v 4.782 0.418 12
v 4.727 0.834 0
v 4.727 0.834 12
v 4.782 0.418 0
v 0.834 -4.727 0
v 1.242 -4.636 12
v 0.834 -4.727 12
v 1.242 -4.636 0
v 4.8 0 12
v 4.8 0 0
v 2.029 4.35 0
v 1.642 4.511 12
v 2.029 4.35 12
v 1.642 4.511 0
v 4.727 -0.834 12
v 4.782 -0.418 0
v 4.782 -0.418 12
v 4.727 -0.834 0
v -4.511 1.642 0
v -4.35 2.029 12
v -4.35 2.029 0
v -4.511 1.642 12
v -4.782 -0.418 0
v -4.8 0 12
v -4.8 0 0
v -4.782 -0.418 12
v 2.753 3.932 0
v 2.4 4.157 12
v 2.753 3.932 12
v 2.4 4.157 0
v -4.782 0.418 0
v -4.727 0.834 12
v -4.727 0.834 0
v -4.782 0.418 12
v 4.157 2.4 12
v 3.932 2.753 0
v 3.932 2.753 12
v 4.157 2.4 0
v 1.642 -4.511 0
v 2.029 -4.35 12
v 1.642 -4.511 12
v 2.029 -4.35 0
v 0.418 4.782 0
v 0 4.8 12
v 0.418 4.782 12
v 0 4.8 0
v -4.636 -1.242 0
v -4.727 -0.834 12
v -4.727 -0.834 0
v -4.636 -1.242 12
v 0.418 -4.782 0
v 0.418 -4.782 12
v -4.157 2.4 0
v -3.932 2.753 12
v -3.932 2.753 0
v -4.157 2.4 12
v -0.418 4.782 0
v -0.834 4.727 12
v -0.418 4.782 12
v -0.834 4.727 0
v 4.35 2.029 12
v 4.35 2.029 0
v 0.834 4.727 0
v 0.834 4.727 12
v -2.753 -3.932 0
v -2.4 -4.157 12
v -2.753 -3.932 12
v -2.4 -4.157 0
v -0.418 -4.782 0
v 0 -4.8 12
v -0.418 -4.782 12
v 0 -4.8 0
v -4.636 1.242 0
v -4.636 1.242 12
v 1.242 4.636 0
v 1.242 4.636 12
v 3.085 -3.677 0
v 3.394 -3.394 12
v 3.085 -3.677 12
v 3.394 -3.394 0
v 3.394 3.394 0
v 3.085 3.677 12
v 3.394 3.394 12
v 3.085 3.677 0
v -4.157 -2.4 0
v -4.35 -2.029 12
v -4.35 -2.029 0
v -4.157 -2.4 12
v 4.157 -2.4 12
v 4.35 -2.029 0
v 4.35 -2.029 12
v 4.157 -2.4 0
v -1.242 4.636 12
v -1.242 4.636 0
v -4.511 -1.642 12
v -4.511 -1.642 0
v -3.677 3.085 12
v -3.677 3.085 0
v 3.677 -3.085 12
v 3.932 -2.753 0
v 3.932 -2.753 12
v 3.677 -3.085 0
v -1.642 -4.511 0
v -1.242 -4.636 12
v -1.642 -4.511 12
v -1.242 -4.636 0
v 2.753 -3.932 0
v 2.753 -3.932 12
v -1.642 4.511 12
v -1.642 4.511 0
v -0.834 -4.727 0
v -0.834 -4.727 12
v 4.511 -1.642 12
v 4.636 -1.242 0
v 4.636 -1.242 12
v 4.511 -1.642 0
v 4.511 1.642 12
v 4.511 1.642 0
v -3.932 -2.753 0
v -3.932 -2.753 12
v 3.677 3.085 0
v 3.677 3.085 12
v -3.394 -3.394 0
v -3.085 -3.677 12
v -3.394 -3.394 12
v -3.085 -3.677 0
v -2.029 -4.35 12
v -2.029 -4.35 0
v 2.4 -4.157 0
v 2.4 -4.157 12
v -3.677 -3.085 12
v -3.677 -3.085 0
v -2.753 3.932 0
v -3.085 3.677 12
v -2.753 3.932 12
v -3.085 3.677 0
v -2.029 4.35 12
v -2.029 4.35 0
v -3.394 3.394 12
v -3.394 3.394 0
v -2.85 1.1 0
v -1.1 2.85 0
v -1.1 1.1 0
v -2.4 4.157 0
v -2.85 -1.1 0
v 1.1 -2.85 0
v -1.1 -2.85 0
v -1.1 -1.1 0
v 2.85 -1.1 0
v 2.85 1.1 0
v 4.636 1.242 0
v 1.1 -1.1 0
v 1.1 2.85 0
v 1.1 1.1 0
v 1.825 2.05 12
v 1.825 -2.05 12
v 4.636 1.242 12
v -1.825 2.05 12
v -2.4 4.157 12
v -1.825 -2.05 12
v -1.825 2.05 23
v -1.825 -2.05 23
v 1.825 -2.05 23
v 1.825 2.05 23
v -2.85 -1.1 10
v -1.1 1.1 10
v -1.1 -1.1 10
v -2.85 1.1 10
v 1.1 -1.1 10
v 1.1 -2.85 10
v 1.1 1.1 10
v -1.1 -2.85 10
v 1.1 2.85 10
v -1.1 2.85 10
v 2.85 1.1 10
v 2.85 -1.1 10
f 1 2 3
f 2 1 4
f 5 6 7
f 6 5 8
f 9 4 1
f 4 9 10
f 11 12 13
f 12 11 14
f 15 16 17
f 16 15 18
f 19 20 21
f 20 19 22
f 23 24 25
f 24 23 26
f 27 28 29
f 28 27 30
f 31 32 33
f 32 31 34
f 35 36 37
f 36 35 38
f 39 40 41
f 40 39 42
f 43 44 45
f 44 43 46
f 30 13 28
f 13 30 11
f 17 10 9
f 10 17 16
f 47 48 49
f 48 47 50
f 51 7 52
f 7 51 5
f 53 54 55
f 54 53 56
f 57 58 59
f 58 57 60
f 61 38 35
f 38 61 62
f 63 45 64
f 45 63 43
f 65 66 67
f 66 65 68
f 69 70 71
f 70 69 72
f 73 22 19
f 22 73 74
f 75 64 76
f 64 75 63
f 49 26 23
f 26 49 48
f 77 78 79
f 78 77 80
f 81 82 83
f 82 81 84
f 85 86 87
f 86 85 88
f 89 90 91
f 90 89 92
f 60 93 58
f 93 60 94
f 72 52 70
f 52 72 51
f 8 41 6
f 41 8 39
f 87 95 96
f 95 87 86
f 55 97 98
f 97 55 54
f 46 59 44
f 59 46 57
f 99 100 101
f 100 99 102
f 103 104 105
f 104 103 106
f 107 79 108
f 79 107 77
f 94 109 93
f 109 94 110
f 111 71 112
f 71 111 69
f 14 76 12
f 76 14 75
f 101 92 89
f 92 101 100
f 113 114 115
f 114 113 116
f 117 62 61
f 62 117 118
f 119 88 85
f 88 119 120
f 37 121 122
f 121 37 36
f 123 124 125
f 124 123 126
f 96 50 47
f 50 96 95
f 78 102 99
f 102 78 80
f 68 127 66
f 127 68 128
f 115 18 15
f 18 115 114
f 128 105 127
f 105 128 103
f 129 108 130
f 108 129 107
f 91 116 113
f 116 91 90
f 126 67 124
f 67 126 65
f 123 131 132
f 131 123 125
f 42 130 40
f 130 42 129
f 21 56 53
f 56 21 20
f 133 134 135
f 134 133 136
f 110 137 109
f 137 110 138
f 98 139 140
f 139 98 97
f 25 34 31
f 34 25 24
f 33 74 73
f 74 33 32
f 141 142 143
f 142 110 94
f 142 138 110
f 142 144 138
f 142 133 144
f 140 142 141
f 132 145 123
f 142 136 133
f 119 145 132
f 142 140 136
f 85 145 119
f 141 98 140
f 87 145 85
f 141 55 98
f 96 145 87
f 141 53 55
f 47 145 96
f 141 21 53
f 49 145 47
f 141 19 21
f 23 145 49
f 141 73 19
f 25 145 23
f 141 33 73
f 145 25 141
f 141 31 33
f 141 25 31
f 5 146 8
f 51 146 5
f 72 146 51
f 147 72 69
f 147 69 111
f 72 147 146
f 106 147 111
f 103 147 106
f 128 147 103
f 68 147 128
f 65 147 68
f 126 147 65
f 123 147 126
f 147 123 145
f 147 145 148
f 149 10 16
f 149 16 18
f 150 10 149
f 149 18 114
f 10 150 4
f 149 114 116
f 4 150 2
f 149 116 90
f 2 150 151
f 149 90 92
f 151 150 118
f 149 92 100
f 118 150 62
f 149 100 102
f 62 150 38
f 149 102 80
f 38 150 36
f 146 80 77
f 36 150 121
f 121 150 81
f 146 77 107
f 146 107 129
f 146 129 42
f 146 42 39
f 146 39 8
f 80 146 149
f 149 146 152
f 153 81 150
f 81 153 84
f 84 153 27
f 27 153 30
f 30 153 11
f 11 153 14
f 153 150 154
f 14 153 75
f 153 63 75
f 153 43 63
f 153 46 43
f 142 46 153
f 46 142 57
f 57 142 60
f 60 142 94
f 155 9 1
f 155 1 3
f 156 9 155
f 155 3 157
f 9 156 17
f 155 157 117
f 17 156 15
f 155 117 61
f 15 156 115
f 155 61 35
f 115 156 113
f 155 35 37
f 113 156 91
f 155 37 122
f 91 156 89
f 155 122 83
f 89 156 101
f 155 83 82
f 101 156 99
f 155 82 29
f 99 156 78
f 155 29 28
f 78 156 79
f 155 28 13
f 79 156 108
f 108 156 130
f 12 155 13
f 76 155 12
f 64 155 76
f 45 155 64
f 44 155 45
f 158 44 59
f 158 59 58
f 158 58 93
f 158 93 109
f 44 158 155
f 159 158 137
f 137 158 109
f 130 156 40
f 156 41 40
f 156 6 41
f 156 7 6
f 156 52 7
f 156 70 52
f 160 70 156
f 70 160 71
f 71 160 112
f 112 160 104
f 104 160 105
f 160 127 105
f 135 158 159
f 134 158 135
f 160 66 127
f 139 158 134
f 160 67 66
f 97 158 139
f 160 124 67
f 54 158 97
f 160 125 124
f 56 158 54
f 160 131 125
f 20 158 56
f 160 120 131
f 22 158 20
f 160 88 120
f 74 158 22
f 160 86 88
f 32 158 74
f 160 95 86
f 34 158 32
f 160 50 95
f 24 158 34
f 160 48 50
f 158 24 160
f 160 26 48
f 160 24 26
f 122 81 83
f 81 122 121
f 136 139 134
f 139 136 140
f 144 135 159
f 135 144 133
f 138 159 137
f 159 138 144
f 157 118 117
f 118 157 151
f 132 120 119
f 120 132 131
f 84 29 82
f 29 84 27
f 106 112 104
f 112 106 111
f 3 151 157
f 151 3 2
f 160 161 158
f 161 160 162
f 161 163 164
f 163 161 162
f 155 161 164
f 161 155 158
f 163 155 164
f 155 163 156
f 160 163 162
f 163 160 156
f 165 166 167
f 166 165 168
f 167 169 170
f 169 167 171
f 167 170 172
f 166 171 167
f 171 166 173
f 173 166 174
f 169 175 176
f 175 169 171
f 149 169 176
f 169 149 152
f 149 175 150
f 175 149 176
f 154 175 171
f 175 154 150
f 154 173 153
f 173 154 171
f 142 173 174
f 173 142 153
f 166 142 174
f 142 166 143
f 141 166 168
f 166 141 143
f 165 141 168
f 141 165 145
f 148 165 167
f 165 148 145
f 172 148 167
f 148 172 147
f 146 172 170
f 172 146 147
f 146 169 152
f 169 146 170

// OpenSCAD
od_barrel = 9.6;
id_barrel = 5.3;
width_axle = 3.65;
depth_axle = 4.1;
technic_tolerance = 0.4;
thickness_technic_leg = 1.8 + technic_tolerance;
protrusion_technic_leg = 1.35 + technic_tolerance;


axle_length = 11;
middle_length = 2;
technic_length = 10;
$fn=72;

difference() {
union() {
//barrel
linear_extrude(technic_length+middle_length)
circle(d=od_barrel);
//appened an axle bit
translate([0,0,technic_length])
linear_extrude(axle_length+middle_length)
    square([width_axle,depth_axle], center = true);
}
//subtract a technics bit
linear_extrude(technic_length)
  polygon([
 [-thickness_technic_leg/2,thickness_technic_leg/2+protrusion_technic_leg],
 [thickness_technic_leg/2,thickness_technic_leg/2+protrusion_technic_leg],
 [thickness_technic_leg/2,thickness_technic_leg/2],
 [thickness_technic_leg/2+protrusion_technic_leg,thickness_technic_leg/2],
 [thickness_technic_leg/2+protrusion_technic_leg,-thickness_technic_leg/2],
 [thickness_technic_leg/2,-thickness_technic_leg/2],
 [thickness_technic_leg/2,-thickness_technic_leg/2-protrusion_technic_leg],
 [-thickness_technic_leg/2,-thickness_technic_leg/2-protrusion_technic_leg],
 [-thickness_technic_leg/2,-thickness_technic_leg/2],
 [-thickness_technic_leg/2-protrusion_technic_leg,-thickness_technic_leg/2],
 [-thickness_technic_leg/2-protrusion_technic_leg,thickness_technic_leg/2],
 [-thickness_technic_leg/2,thickness_technic_leg/2],



]);
}
